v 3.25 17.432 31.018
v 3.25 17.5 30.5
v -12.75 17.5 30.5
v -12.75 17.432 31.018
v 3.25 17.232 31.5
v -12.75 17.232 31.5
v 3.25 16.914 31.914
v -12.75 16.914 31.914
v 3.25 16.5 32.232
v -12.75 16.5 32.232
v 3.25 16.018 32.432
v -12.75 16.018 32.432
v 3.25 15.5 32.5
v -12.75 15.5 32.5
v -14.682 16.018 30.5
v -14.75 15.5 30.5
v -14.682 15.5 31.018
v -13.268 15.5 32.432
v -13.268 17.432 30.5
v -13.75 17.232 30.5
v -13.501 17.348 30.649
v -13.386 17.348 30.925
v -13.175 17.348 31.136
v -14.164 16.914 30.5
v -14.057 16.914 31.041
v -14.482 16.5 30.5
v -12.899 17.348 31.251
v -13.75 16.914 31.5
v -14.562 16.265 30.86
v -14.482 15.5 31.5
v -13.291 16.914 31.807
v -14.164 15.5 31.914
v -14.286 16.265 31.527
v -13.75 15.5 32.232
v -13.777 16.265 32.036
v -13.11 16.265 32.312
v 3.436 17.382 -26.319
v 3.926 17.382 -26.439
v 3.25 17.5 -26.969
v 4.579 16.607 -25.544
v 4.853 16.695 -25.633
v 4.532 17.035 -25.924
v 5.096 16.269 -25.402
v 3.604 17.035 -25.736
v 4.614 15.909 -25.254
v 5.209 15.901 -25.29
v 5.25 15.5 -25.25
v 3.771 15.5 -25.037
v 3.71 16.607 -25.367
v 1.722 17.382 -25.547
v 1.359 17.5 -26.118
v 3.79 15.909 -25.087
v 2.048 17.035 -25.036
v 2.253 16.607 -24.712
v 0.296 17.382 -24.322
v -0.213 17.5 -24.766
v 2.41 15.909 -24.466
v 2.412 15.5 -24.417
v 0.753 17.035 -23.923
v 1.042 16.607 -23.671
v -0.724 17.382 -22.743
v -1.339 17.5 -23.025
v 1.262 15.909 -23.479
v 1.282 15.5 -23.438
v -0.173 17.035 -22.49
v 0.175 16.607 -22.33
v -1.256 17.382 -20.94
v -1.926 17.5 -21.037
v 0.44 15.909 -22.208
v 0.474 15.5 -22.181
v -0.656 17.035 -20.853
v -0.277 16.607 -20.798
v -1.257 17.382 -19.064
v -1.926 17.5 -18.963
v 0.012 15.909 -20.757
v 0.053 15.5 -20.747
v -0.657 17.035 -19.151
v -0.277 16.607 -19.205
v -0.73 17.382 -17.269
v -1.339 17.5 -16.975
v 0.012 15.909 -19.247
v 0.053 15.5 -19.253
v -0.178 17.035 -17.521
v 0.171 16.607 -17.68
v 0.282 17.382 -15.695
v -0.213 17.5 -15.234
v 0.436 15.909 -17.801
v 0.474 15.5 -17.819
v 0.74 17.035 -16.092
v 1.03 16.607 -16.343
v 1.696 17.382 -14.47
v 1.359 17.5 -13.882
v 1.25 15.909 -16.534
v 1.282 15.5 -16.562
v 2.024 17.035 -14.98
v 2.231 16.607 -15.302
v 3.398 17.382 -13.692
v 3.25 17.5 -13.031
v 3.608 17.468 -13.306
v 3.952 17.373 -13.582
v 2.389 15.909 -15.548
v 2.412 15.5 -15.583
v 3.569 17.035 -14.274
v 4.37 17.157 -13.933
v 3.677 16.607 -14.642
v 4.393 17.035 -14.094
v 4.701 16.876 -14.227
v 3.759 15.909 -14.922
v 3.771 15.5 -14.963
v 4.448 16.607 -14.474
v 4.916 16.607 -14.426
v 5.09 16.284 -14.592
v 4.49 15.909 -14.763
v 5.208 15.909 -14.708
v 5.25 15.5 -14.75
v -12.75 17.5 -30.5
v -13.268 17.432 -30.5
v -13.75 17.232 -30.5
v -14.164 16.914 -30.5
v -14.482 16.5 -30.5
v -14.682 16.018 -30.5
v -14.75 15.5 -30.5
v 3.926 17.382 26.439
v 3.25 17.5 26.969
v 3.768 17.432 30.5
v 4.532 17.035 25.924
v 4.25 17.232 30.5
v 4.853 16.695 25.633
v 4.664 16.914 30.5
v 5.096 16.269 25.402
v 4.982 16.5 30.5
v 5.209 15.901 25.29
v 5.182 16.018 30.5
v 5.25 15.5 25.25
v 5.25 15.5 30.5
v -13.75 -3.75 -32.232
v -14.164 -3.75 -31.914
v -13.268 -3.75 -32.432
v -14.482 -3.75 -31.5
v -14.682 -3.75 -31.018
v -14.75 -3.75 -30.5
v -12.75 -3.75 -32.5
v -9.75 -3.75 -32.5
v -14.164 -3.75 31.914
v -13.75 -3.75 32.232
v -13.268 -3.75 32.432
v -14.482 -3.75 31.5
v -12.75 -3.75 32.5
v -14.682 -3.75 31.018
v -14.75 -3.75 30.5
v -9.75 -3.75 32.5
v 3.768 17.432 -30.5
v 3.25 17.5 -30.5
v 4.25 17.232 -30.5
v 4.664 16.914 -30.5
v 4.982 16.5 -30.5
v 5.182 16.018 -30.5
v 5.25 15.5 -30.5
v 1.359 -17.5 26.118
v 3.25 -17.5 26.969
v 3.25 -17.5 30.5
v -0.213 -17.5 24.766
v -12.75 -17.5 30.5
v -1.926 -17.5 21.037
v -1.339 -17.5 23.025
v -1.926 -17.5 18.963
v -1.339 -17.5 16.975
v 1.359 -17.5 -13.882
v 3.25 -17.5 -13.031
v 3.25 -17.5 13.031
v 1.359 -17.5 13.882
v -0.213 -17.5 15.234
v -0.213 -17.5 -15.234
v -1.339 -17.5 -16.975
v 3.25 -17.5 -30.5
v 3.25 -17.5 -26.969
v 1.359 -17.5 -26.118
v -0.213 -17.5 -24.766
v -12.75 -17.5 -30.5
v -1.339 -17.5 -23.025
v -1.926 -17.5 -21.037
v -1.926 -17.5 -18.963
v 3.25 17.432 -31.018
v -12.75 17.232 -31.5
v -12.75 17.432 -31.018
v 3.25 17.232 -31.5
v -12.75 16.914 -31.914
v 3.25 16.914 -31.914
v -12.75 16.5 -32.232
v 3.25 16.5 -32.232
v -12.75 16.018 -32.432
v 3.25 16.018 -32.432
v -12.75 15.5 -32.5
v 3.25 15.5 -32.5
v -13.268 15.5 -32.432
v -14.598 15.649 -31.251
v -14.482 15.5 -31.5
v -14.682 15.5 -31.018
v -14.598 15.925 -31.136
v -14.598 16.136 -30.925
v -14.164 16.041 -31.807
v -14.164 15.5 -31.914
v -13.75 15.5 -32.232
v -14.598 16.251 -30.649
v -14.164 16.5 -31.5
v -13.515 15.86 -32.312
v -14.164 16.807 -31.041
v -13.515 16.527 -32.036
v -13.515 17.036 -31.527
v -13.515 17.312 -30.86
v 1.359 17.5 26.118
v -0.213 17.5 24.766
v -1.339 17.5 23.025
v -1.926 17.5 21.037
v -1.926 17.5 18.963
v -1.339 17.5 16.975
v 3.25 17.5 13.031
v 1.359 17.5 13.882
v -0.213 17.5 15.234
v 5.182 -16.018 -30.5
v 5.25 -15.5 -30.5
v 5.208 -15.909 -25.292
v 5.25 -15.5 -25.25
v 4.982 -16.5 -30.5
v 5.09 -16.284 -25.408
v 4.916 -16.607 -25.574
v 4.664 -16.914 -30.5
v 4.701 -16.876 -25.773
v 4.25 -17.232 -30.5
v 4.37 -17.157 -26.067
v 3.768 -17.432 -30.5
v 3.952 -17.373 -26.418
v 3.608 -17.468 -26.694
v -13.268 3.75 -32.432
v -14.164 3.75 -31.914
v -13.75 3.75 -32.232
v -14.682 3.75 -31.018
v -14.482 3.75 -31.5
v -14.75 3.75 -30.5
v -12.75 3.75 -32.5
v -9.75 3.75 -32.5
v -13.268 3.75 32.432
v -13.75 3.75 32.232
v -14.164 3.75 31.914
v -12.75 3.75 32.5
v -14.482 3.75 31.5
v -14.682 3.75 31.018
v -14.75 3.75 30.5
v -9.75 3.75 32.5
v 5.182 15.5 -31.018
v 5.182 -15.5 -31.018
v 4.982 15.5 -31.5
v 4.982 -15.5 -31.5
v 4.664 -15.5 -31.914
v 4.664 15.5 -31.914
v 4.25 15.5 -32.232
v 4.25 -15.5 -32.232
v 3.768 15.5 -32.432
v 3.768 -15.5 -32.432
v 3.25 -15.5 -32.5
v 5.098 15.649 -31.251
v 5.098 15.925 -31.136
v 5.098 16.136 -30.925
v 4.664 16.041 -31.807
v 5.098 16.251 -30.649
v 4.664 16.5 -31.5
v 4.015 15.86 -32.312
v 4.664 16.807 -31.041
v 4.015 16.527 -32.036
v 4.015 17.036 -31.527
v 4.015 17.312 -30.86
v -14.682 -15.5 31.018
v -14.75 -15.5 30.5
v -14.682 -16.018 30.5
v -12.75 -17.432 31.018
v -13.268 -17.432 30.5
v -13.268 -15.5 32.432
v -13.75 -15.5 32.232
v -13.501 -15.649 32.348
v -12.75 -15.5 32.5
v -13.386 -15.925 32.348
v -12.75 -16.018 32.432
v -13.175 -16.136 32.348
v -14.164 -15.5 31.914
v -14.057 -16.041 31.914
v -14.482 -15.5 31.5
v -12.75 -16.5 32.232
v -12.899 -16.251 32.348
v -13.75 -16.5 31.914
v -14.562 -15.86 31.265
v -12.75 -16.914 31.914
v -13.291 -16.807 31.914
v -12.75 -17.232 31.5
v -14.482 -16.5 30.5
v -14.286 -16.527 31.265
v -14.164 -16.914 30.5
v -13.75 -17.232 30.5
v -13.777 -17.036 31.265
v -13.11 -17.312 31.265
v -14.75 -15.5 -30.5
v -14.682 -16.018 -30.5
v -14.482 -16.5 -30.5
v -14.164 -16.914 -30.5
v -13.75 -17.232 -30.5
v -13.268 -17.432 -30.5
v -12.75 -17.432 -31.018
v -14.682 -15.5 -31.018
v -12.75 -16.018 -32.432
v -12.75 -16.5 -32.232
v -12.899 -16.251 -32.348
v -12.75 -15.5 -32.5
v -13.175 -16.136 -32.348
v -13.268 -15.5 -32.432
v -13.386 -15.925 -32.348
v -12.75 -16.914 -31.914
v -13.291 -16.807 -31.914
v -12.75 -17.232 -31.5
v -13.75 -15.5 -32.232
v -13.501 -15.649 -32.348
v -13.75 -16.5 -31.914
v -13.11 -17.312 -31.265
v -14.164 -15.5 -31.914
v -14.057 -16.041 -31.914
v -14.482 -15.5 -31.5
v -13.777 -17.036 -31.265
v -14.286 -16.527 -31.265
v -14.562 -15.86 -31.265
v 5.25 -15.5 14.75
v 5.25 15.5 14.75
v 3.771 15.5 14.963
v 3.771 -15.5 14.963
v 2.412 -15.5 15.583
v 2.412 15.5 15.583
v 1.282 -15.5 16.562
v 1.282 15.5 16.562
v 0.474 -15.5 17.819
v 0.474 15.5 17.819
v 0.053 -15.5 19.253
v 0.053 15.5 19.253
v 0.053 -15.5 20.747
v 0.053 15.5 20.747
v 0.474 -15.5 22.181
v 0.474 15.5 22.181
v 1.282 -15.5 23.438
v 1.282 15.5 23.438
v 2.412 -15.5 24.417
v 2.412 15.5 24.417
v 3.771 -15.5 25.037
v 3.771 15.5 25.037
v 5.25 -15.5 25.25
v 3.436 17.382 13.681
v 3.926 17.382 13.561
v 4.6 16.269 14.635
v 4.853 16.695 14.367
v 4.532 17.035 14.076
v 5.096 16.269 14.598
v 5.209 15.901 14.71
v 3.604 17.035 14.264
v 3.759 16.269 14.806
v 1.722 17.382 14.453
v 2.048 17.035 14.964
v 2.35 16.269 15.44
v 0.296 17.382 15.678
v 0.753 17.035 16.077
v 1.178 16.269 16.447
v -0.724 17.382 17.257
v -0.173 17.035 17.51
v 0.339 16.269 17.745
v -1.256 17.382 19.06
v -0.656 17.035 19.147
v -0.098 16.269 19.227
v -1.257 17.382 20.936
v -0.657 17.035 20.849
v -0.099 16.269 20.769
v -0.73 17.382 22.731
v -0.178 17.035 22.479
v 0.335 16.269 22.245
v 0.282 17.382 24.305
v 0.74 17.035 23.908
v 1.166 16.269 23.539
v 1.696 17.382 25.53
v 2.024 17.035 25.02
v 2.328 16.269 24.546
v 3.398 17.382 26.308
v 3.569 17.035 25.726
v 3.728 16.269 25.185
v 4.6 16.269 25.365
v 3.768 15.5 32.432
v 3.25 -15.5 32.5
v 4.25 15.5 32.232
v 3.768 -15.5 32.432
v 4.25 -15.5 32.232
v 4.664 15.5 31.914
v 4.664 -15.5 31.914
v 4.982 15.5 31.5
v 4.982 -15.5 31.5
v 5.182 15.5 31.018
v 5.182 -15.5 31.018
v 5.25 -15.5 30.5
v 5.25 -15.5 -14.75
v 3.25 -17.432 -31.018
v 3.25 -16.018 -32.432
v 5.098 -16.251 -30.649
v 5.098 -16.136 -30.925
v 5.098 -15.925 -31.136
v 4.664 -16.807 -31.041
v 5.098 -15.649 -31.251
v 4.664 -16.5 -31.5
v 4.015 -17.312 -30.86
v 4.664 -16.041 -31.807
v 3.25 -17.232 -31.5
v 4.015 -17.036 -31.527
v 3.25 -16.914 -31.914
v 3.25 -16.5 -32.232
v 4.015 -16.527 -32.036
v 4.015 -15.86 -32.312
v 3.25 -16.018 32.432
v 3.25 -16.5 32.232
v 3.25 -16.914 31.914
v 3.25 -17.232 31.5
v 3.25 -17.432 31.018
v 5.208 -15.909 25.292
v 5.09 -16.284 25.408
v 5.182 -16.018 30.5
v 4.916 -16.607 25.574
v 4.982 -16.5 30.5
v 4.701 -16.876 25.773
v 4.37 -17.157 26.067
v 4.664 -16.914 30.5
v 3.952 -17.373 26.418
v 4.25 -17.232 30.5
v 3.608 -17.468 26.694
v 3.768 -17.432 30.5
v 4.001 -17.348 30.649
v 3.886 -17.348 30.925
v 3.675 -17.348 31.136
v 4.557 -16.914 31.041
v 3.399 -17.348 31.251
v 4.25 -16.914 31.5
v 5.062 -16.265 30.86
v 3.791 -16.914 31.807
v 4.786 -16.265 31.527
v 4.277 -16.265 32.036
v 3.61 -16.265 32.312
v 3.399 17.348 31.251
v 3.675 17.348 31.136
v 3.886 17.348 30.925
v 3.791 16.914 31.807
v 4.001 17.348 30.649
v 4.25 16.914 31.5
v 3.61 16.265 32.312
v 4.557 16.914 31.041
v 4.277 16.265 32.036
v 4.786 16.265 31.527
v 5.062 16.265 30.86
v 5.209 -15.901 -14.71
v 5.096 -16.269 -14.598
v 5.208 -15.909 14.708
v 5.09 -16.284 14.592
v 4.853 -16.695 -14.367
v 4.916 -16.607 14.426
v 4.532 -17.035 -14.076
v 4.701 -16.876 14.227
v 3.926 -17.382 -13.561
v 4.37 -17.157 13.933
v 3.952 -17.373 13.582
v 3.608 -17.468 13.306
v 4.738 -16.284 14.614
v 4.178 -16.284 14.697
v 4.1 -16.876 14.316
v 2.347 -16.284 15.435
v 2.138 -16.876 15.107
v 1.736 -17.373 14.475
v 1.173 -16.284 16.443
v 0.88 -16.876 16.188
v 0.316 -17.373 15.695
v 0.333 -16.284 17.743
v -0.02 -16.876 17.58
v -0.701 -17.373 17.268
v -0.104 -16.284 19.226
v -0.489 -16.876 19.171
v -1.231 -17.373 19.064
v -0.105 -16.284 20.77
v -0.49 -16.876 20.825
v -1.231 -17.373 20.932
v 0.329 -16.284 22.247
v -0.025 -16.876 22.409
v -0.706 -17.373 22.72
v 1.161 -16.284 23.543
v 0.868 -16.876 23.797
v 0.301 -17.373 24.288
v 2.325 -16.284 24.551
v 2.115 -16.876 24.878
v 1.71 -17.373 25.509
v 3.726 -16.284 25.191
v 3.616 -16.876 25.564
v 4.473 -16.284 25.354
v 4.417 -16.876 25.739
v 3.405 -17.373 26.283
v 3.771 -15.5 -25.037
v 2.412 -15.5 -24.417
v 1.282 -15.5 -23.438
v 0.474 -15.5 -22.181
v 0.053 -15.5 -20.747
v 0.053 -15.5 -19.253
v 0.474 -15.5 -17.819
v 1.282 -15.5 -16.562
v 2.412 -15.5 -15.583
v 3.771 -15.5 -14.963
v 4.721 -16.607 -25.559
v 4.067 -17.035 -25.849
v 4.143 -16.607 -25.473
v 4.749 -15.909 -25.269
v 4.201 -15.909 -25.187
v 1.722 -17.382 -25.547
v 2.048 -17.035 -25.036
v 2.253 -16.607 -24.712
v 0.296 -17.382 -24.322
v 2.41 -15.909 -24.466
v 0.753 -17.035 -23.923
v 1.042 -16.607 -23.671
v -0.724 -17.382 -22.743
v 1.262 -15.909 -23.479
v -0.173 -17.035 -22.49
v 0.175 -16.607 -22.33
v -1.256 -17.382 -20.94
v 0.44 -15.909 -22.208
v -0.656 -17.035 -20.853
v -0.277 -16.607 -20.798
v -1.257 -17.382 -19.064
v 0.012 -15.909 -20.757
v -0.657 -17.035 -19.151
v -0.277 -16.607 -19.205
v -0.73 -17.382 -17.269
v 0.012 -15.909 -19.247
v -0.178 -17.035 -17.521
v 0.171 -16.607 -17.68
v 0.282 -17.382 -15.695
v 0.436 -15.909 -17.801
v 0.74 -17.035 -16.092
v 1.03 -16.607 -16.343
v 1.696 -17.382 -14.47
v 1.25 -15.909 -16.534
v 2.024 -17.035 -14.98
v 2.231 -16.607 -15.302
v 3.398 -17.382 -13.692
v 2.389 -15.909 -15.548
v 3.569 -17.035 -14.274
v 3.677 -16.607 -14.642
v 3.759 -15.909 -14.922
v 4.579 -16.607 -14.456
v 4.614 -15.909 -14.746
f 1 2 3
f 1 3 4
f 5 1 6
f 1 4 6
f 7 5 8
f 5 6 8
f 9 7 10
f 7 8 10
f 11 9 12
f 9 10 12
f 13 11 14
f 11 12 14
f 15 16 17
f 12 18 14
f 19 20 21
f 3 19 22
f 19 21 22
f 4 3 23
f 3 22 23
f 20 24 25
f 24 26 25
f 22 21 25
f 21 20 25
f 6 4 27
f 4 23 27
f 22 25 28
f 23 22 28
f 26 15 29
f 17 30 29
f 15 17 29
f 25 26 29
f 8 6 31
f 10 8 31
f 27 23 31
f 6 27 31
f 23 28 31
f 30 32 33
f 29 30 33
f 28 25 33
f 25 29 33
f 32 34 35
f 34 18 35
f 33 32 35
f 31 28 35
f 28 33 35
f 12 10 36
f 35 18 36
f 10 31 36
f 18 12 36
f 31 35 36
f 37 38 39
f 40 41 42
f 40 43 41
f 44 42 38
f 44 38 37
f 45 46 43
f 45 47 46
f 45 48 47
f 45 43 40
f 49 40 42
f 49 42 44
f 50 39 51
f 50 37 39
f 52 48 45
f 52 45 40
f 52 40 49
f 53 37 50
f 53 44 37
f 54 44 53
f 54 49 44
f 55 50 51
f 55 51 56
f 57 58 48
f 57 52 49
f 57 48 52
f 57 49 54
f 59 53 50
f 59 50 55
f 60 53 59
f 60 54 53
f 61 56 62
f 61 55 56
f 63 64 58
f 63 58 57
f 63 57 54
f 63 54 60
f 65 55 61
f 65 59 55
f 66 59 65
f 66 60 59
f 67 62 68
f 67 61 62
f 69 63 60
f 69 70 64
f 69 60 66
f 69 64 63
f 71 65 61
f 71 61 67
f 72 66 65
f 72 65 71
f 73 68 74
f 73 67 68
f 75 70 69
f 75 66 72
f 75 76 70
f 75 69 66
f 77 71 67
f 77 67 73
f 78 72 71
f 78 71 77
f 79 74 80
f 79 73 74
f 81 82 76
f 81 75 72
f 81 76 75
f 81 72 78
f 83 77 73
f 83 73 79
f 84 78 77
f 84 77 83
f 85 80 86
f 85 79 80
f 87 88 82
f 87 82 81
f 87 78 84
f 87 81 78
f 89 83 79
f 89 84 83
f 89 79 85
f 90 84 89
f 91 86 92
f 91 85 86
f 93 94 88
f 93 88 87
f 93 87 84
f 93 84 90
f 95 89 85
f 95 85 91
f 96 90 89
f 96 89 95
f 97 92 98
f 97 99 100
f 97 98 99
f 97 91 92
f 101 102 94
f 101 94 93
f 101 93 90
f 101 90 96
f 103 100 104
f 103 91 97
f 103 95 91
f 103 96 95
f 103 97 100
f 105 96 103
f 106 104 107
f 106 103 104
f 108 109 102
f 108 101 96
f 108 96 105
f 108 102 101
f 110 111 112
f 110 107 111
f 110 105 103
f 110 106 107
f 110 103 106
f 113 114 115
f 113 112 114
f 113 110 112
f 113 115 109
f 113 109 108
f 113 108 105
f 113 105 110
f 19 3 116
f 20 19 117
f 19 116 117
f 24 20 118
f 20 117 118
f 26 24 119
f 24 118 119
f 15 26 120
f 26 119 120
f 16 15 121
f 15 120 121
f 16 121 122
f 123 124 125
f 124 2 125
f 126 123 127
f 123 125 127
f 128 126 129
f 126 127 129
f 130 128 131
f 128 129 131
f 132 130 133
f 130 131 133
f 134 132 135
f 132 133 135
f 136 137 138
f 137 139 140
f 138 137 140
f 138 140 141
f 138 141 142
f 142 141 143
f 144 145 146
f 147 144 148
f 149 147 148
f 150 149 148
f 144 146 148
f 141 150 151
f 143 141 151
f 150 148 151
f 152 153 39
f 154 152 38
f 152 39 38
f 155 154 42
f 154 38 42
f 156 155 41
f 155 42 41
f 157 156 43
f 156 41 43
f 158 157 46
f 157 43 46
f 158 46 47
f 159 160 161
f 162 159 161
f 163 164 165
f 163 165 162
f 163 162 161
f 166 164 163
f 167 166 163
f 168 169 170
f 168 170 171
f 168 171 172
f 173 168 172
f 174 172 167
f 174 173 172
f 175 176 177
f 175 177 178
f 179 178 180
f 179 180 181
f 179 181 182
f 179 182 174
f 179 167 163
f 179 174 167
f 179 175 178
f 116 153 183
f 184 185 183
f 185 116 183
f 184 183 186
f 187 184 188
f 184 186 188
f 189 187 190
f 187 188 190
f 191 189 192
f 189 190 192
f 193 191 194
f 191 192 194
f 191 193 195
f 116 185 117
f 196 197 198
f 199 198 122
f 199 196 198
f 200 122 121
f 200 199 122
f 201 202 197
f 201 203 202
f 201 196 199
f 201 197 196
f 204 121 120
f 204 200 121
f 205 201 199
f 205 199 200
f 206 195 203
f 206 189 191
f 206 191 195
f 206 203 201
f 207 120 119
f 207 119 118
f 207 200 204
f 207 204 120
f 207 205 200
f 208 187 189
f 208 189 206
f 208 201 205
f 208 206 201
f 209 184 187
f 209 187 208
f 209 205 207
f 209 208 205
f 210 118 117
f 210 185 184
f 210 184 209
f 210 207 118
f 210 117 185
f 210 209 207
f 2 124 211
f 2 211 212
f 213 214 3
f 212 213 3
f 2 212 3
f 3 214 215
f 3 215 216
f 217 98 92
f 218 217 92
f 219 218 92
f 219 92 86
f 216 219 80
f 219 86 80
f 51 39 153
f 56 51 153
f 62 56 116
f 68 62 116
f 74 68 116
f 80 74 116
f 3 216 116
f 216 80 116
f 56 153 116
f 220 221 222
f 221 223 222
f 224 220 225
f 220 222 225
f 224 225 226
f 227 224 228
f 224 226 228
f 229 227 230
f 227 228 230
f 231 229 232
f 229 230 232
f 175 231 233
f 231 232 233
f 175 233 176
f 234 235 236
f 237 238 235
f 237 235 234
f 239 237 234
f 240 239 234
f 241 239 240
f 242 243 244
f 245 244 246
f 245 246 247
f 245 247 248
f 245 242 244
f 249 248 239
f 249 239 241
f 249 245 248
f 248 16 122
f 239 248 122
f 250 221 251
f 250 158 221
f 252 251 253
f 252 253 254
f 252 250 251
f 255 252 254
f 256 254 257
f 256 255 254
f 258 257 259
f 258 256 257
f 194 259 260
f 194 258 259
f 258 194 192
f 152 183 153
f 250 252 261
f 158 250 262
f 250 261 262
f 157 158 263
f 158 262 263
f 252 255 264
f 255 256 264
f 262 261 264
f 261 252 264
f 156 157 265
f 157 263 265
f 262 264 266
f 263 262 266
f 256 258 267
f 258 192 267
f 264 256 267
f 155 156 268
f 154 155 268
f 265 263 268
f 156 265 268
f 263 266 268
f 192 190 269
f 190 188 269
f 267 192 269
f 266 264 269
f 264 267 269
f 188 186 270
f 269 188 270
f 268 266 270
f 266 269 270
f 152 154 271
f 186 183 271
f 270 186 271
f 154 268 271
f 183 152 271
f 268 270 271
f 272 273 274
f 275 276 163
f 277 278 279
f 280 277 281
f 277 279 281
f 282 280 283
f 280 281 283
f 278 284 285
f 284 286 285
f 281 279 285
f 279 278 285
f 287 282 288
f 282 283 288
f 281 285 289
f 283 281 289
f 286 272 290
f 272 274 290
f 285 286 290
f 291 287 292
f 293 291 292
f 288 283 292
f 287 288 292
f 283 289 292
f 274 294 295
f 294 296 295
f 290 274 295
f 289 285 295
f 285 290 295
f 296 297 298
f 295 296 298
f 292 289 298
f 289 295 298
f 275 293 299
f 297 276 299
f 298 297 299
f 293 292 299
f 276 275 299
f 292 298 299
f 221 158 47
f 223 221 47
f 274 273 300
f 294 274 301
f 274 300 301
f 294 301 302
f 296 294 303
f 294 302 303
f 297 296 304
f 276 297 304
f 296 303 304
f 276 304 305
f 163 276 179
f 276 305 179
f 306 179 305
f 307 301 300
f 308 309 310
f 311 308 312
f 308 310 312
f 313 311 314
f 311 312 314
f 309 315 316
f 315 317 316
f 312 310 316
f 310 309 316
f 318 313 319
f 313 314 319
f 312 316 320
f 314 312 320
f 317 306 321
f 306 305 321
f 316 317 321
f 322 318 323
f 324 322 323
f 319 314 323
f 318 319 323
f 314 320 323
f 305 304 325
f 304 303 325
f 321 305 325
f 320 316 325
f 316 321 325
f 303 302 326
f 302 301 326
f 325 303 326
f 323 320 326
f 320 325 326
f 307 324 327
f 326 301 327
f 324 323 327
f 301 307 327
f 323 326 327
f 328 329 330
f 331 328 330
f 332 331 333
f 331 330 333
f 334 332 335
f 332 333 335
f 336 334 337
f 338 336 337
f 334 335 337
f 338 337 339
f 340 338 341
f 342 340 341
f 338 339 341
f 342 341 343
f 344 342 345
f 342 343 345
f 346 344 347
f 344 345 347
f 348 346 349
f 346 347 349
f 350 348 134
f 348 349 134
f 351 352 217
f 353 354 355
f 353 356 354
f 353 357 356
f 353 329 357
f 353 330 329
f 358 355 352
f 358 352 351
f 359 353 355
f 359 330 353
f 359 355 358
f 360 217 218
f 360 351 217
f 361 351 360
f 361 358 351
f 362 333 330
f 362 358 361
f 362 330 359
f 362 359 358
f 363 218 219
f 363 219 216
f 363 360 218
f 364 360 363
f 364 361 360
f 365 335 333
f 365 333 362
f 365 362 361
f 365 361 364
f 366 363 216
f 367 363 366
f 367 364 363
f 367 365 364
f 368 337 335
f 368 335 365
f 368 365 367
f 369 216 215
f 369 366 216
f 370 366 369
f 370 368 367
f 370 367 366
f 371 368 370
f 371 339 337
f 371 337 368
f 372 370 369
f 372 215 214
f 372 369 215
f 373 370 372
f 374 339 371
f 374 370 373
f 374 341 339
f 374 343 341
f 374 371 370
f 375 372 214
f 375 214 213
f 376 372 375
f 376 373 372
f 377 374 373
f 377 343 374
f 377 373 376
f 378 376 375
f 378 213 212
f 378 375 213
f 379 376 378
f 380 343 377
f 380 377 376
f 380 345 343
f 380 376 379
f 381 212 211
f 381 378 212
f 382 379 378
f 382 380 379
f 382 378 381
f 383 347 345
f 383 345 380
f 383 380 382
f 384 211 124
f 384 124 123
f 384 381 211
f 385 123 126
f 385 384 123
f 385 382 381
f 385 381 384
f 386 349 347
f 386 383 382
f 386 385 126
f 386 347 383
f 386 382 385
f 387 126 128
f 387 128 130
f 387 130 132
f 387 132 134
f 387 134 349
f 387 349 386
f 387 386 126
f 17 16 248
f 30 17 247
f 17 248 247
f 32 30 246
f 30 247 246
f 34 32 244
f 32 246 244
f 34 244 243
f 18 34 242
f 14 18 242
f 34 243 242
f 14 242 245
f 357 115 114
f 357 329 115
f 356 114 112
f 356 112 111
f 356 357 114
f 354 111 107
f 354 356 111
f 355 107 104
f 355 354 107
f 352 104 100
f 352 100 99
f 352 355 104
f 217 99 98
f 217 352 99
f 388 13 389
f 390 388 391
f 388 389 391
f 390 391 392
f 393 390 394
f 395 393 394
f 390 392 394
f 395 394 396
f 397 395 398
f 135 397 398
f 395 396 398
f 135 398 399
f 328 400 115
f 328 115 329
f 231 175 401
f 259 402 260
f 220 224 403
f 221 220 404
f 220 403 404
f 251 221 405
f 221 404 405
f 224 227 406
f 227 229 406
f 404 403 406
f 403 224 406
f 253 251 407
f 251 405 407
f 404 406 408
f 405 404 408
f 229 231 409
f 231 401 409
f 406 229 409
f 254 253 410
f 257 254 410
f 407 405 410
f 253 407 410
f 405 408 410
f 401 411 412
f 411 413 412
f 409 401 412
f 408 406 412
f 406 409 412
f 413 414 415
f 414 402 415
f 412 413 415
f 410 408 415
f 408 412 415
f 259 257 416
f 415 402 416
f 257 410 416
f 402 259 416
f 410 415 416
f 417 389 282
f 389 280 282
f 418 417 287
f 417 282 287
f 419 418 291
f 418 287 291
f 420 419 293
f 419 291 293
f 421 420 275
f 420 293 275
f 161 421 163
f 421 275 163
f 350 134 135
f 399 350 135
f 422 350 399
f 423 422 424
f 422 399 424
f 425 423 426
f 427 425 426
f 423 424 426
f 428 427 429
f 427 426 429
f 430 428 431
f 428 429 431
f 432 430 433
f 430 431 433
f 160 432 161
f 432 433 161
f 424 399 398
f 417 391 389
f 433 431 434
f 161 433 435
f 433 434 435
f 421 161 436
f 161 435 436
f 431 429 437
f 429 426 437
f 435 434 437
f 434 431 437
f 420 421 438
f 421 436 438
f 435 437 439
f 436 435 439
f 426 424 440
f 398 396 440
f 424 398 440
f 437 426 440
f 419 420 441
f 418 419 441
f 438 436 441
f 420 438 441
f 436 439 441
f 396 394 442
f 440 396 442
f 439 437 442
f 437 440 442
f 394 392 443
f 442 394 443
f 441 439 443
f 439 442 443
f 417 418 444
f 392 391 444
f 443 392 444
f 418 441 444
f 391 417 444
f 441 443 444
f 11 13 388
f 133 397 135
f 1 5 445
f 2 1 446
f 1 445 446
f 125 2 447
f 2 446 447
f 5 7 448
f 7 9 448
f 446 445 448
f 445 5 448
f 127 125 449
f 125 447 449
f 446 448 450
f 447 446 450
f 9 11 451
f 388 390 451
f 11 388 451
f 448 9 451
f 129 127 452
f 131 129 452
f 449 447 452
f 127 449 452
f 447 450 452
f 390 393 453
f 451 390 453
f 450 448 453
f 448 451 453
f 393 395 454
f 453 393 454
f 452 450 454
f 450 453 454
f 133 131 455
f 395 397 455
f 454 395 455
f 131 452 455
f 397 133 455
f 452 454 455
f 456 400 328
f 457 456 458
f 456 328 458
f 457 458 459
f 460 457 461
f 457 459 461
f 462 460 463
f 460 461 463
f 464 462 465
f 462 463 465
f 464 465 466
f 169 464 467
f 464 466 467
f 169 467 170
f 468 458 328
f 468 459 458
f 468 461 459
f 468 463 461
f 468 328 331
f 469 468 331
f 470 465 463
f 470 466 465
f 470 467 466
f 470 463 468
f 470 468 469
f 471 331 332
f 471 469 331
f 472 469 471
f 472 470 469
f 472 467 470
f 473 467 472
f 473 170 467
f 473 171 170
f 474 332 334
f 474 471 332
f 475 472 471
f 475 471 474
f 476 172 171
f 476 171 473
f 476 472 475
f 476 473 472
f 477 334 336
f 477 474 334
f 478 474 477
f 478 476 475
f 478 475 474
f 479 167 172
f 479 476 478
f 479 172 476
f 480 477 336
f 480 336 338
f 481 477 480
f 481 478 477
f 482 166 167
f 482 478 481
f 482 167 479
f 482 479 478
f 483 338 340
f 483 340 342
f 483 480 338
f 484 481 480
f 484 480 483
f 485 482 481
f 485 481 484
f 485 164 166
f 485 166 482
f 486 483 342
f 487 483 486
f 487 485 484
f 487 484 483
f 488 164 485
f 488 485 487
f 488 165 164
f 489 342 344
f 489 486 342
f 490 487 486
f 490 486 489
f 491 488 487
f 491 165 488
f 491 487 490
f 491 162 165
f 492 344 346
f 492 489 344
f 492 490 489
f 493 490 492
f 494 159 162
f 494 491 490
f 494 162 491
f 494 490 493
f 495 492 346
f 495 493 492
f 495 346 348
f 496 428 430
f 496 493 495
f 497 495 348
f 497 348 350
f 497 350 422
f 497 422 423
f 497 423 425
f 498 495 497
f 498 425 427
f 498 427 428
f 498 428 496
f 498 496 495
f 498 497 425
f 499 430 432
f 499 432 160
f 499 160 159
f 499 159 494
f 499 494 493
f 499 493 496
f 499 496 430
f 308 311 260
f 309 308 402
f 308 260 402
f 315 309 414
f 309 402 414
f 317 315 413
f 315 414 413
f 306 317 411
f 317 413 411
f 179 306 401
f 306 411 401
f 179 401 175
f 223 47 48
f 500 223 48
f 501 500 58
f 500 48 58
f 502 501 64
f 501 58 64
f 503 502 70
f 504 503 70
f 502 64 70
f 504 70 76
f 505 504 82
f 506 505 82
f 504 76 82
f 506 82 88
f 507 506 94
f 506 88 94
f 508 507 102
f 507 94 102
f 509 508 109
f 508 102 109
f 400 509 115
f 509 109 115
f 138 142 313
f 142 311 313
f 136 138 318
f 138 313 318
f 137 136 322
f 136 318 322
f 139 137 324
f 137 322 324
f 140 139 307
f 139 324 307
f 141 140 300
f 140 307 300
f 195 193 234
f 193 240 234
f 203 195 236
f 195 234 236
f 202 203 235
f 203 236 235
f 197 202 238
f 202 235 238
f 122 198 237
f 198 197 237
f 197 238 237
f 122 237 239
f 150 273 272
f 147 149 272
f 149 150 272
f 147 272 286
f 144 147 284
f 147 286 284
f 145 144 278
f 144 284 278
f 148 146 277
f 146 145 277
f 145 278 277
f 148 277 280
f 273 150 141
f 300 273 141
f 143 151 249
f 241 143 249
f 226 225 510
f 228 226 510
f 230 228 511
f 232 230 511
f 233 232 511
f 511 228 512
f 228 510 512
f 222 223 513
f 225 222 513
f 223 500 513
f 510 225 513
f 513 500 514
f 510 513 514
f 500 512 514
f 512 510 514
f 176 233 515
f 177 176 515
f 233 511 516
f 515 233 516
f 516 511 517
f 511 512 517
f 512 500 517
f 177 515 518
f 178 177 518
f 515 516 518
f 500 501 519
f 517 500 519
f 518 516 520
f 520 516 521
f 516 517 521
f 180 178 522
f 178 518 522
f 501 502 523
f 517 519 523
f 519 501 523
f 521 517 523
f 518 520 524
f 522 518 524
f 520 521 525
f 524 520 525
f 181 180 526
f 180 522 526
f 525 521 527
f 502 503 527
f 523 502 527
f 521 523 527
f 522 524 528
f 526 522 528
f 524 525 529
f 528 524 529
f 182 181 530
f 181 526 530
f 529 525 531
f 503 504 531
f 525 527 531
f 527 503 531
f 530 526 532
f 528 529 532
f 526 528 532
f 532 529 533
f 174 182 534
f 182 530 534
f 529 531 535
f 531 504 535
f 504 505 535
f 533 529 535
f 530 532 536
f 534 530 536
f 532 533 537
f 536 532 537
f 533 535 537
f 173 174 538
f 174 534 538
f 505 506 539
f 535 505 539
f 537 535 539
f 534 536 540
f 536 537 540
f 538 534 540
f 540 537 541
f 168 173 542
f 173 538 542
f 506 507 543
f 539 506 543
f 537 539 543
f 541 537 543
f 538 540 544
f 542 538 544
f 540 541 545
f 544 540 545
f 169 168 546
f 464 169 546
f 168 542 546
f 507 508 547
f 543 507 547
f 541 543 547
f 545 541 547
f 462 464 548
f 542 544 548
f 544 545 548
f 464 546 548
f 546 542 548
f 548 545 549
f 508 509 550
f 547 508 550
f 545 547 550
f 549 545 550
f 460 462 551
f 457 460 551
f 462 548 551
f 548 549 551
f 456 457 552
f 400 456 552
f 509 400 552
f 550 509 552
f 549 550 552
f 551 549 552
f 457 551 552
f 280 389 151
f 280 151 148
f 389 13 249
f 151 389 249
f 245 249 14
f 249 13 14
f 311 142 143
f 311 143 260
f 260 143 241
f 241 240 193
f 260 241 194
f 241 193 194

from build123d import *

# Parameters (mm, degrees)
BOSS_EXTRUDE1_DEPTH = 17.5
FILLET1_R           = 2
SKETCH3_W           = 5
SKETCH3_H           = 7.5
CUT_EXTRUDE1_DEPTH  = 66


with BuildPart() as part:
    # Sketch2 → Boss-Extrude1 (new body, symmetric)
    with BuildSketch(Plane(origin=(0, 0, 0), x_dir=(1, 0, 0), z_dir=(0, 1, 0))):
        with BuildLine():
            Line((5.25, 14.75), (5.25, -14.75))
            ThreePointArc((5.25, -14.75), (0, -20), (5.25, -25.25))
            Line((5.25, -25.25), (5.25, -32.5))
            Line((5.25, -32.5), (-14.75, -32.5))
            Line((-14.75, -32.5), (-14.75, 32.5))
            Line((-14.75, 32.5), (5.25, 32.5))
            Line((5.25, 32.5), (5.25, 25.25))
            ThreePointArc((5.25, 25.25), (0, 20), (5.25, 14.75))
        make_face()
    extrude(amount=BOSS_EXTRUDE1_DEPTH, both=True)

    # Fillet1
    fillet1_edges = [part.edges().sort_by_distance(p)[0] for p in [
        (-14.75, -17.5, 0),
        (-4.75, -17.5, -32.5),
        (5.25, -17.5, -28.875),
        (0, -17.5, -20),
        (-4.75, 17.5, -32.5),
        (5.25, 0, 32.5),
        (-14.75, 0, 32.5),
        (-14.75, 0, -32.5),
        (5.25, 0, -32.5),
        (-14.75, 17.5, 0),
        (-4.75, 17.5, 32.5),
        (5.25, 17.5, 28.875),
        (0, 17.5, 20),
        (5.25, 17.5, 0),
        (0, 17.5, -20),
        (5.25, -17.5, 0),
        (5.25, 17.5, -28.875),
        (0, -17.5, 20),
        (5.25, -17.5, 28.875),
        (-4.75, -17.5, 32.5),
    ]]
    fillet(fillet1_edges, radius=FILLET1_R)

    # Sketch3 → Cut-Extrude1 (cut, through all)
    with BuildSketch(Plane.XY.offset(32.5)):
        with Locations((-12.25, 0)):
            Rectangle(SKETCH3_W, SKETCH3_H)
    extrude(amount=-CUT_EXTRUDE1_DEPTH, mode=Mode.SUBTRACT)


solid = part.part
